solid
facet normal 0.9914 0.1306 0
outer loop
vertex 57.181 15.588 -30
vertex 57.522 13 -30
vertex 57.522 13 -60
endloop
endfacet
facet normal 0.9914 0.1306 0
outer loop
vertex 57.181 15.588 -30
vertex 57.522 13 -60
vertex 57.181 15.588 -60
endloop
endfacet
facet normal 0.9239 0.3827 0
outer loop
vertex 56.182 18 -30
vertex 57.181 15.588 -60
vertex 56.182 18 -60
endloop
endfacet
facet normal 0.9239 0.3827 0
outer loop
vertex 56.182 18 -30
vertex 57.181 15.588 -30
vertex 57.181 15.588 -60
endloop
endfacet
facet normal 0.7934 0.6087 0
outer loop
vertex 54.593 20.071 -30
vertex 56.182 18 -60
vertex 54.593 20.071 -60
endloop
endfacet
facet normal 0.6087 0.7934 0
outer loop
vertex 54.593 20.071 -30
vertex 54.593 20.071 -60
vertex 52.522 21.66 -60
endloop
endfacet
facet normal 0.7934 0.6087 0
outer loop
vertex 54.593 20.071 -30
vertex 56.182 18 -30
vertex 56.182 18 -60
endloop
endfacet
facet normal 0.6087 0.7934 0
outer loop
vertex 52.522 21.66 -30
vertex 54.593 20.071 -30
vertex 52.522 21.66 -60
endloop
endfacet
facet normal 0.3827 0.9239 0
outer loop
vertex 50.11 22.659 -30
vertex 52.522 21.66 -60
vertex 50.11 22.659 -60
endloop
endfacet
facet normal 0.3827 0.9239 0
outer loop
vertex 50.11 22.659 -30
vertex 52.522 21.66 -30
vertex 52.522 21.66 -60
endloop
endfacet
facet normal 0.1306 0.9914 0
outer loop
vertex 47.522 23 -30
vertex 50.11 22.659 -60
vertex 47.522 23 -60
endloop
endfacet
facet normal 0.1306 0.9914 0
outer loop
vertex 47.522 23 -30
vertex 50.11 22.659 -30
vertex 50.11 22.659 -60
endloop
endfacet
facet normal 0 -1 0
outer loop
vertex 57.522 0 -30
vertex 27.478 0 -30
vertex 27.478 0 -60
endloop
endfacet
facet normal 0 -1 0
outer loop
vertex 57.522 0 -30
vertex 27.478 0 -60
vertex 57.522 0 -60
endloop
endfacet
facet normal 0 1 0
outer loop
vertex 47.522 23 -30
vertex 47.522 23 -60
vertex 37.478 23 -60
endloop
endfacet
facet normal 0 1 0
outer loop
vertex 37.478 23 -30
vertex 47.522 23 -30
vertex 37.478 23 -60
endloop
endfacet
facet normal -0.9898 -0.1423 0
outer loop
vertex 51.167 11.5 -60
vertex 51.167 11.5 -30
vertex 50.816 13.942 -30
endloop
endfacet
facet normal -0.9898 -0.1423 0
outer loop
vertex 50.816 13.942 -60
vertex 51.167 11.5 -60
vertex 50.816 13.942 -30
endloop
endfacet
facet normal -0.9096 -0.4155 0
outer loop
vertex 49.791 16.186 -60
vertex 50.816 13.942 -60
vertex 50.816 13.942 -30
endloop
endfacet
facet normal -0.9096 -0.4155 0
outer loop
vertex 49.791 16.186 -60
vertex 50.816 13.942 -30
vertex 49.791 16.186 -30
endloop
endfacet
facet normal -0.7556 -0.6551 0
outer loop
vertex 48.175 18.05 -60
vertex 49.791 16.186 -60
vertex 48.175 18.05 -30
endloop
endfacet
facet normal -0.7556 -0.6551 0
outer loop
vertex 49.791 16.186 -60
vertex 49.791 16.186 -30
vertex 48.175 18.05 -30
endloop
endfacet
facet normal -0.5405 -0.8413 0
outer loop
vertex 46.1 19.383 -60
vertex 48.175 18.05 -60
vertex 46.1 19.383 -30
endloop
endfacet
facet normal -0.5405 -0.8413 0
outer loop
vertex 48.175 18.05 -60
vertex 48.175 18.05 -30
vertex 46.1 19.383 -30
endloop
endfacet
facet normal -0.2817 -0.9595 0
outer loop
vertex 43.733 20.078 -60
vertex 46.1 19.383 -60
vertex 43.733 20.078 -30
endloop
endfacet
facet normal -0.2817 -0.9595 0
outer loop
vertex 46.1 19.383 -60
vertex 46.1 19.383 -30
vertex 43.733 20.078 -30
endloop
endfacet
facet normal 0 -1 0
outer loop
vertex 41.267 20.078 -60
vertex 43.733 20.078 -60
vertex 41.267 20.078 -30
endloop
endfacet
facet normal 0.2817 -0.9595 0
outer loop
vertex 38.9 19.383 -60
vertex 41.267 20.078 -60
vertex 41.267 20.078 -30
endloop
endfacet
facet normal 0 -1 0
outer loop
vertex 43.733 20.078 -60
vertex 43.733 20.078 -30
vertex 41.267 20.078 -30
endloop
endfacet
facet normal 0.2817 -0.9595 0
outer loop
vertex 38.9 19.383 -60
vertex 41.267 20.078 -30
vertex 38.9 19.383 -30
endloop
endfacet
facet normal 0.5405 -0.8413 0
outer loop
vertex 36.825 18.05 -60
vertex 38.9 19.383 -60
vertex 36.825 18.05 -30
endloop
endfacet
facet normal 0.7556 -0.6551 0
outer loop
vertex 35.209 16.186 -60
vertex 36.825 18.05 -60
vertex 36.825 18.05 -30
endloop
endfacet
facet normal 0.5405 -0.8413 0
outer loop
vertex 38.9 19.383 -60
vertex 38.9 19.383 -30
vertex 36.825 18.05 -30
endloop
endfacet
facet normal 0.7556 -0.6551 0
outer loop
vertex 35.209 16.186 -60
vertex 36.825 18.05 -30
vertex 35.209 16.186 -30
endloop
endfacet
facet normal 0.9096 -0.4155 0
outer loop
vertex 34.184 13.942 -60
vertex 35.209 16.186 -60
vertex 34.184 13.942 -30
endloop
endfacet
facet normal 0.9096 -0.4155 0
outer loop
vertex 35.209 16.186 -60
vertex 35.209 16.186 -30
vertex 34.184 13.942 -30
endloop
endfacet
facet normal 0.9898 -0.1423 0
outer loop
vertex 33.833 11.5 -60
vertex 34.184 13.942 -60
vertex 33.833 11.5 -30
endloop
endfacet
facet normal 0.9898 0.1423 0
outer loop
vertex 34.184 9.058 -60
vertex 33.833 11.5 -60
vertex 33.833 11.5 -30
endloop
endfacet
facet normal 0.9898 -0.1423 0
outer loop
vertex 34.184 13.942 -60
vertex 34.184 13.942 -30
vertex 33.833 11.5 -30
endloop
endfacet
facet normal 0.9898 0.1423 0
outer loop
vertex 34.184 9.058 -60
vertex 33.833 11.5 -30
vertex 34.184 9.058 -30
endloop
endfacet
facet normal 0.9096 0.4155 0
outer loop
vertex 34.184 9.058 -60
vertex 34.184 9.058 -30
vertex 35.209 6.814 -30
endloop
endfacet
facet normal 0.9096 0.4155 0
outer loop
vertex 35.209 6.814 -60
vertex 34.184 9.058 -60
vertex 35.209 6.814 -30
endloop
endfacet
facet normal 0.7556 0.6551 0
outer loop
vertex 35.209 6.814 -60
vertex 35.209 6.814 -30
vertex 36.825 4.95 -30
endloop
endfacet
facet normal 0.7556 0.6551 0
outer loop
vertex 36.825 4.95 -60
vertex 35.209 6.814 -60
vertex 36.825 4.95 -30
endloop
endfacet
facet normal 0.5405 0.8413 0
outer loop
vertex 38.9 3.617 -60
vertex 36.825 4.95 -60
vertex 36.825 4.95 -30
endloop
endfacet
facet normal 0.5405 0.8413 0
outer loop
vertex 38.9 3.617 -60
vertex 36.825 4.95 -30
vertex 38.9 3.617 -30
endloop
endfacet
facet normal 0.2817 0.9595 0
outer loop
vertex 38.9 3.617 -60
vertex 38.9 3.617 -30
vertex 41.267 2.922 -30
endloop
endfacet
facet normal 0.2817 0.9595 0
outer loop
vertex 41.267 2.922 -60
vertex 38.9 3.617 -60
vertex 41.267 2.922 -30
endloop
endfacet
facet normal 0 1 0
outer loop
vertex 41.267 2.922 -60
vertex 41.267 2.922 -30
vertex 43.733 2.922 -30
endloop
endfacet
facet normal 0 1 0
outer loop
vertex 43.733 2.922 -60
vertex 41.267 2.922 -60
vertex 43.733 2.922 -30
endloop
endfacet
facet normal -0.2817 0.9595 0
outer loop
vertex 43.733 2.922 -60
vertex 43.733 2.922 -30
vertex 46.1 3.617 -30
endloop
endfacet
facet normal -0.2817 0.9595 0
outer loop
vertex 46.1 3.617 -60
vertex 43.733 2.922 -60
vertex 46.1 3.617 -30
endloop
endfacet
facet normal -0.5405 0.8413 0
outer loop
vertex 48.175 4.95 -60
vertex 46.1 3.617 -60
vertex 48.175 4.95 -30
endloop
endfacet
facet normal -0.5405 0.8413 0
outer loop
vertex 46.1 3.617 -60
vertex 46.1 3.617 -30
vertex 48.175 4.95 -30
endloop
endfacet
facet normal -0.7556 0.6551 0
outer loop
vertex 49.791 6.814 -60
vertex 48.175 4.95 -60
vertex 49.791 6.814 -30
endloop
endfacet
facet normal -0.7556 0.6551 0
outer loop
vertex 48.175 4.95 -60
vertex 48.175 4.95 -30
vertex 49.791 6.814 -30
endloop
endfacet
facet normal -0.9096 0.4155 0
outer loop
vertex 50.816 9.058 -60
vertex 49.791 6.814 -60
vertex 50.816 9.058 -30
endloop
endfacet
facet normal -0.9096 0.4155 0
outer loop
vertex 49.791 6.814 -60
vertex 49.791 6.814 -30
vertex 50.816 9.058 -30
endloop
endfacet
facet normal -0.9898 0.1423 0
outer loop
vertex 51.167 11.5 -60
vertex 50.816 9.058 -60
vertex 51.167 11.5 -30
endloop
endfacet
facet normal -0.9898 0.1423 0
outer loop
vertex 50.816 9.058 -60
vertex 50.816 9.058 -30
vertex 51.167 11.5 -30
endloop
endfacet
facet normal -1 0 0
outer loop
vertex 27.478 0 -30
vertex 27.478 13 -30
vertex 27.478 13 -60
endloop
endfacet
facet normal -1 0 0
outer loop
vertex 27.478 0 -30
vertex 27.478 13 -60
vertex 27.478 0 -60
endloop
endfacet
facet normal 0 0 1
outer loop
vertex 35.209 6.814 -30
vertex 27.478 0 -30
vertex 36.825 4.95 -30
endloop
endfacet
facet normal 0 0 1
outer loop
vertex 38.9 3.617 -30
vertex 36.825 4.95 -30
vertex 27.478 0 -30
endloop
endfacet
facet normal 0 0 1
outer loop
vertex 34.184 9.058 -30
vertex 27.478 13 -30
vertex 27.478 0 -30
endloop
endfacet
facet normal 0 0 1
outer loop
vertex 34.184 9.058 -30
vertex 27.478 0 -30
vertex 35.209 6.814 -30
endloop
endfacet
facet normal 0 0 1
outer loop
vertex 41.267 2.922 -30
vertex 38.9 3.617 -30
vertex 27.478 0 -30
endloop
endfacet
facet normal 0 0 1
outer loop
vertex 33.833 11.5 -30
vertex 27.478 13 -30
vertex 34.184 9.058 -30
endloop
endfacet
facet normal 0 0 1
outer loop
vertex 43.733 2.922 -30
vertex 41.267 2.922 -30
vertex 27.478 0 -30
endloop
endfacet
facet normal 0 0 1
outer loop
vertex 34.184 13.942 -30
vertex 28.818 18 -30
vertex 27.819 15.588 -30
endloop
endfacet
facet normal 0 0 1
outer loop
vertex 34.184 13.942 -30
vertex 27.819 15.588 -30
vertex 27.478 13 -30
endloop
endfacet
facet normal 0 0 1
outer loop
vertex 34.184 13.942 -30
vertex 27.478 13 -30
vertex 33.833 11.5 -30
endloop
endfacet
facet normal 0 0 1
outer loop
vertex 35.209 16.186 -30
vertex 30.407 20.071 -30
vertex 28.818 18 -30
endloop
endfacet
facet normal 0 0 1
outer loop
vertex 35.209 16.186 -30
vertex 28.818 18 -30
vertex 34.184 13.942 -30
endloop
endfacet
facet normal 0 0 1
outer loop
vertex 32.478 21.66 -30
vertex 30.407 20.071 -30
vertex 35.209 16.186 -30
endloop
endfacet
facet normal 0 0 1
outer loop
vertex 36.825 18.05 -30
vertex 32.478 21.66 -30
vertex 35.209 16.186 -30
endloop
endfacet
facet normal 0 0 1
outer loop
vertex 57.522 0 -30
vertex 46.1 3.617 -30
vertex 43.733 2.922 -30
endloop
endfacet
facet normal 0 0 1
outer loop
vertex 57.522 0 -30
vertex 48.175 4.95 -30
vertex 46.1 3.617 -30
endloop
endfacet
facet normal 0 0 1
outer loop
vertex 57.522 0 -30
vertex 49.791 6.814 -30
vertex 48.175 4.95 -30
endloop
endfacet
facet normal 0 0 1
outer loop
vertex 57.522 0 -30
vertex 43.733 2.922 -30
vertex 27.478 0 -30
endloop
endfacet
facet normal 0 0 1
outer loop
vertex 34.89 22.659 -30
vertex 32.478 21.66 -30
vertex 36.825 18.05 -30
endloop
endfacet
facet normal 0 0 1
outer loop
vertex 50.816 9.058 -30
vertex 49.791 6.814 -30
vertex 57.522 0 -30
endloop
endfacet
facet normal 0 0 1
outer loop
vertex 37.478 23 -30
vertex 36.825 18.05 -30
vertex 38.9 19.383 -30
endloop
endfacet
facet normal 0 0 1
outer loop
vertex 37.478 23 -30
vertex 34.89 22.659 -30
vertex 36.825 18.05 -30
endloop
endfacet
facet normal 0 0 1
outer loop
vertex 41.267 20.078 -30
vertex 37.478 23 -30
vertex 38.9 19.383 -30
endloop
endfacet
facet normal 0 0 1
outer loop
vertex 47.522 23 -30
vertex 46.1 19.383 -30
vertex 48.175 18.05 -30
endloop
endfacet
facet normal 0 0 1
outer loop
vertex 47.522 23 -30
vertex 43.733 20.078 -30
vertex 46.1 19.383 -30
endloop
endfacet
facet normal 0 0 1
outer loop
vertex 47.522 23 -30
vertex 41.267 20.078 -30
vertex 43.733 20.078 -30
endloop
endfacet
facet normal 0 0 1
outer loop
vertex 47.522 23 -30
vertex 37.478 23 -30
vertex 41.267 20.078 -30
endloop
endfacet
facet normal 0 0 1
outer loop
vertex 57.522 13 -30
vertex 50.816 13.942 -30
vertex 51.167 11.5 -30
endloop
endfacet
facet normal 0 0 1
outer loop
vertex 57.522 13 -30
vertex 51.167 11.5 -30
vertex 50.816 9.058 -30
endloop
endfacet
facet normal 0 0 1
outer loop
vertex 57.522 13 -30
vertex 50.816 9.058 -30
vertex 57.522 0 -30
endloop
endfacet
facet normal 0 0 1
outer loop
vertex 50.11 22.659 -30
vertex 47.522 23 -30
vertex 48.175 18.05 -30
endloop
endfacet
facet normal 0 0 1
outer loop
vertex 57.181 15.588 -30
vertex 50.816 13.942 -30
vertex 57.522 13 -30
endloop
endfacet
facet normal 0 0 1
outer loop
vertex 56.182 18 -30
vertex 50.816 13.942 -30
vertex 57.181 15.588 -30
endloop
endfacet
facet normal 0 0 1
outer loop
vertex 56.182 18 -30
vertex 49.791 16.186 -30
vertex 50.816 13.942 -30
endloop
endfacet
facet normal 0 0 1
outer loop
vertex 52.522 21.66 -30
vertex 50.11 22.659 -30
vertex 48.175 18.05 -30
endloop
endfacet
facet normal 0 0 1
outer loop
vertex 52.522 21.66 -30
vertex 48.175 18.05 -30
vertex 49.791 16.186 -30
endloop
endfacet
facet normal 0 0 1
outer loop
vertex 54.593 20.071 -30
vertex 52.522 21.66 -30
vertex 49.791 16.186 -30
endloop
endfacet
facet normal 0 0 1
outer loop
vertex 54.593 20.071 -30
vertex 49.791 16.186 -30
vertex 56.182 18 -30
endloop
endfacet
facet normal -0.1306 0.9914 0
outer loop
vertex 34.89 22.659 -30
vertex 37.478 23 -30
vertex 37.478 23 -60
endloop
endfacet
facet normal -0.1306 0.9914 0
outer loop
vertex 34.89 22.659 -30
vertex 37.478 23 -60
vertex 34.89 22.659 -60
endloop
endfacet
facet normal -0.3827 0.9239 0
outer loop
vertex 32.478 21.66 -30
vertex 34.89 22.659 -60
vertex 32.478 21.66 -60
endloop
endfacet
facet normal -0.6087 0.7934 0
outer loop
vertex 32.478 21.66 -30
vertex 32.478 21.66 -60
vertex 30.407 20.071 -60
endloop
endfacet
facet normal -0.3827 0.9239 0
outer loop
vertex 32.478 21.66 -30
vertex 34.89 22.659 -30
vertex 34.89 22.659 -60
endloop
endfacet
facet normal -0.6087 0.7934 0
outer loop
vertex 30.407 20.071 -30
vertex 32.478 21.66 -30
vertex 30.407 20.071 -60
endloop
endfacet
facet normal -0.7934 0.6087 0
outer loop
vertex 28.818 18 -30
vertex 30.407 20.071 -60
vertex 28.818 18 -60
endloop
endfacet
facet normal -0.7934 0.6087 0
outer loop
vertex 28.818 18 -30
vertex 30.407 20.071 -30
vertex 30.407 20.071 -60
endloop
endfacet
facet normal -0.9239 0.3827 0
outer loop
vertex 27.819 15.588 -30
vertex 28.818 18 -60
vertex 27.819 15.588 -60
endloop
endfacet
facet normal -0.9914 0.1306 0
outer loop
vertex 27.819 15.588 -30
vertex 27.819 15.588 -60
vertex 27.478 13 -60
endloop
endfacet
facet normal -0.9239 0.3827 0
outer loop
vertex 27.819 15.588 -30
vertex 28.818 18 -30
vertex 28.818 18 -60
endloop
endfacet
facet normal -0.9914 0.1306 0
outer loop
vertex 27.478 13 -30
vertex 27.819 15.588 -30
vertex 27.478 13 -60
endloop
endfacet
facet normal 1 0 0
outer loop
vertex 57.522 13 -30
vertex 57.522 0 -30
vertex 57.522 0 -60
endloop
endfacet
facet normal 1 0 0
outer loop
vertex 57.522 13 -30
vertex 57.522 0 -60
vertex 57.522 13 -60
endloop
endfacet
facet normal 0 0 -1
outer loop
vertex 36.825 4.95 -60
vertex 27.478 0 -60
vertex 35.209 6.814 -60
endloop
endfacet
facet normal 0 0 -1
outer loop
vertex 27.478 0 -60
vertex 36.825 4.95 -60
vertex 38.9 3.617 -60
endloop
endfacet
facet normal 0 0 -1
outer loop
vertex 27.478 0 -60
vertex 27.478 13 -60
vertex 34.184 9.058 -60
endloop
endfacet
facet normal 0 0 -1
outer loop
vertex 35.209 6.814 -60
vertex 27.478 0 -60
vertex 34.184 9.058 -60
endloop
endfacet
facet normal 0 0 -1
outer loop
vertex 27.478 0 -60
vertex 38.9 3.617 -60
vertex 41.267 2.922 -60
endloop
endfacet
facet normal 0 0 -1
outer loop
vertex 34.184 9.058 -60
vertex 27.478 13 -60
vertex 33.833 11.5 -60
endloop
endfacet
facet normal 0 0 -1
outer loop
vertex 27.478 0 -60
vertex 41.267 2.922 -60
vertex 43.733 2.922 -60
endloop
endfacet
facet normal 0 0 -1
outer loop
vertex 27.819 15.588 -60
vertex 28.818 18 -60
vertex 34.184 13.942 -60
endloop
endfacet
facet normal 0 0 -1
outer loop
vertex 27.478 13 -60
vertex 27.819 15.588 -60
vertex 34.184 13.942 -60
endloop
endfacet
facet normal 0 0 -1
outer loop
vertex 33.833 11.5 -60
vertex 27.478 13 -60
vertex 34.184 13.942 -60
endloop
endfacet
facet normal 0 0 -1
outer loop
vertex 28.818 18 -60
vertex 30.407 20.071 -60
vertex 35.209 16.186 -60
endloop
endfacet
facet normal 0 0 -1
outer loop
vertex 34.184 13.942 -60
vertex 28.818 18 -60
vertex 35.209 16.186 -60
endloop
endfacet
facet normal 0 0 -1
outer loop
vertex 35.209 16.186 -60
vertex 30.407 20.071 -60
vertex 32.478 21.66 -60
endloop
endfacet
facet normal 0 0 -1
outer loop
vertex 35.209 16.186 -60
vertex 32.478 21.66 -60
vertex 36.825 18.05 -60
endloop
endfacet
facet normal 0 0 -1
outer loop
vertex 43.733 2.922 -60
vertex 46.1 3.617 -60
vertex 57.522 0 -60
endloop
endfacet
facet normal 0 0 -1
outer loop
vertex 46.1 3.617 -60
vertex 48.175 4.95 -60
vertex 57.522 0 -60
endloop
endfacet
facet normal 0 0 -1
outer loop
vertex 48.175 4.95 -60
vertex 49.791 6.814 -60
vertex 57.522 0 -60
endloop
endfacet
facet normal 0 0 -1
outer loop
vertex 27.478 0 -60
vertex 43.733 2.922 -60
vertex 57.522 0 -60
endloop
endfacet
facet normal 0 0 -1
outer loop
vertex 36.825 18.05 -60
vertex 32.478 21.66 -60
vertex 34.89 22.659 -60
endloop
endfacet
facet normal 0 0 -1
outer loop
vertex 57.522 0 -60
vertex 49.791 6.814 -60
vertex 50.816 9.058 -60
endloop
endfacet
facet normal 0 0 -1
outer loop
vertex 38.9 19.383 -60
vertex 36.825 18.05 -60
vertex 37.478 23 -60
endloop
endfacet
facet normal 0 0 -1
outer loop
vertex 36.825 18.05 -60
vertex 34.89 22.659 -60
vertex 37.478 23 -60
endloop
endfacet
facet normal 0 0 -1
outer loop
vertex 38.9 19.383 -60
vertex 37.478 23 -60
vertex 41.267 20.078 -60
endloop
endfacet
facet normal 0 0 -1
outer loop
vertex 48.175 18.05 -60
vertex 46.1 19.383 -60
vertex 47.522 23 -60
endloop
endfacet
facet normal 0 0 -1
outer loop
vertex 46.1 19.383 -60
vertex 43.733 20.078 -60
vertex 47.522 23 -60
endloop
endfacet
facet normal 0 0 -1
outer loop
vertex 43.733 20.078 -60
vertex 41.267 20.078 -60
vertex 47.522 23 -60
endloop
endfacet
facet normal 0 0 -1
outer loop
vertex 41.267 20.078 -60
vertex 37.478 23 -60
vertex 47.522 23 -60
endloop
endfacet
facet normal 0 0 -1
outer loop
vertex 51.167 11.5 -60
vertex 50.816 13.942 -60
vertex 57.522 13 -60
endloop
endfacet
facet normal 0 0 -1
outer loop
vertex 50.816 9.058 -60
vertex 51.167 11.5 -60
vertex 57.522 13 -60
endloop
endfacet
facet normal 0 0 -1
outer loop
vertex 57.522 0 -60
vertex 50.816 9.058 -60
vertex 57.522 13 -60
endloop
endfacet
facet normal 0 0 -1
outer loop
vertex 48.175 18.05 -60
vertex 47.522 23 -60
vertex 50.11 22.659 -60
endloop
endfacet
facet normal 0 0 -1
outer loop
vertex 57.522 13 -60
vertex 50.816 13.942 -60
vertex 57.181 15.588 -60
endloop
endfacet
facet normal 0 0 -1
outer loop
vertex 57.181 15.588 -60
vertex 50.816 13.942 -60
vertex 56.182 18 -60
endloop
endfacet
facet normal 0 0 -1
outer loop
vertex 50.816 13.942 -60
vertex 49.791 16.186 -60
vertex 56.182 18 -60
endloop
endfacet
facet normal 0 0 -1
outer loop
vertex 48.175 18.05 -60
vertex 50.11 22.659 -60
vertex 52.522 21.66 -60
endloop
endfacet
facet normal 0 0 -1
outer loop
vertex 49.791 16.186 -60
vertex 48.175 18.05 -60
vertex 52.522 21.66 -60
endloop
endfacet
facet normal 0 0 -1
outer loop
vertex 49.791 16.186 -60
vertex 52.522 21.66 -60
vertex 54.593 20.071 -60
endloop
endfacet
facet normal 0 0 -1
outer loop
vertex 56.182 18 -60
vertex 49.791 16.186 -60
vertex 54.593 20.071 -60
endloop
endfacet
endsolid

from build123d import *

# Parameters (mm, degrees)
EXTRUDE_START   = -30
SKETCH_1_R      = 8.666666667
EXTRUDE_1_DEPTH = 30


with BuildPart() as part:
    # 草图1 → 凸台-拉伸1 (new body)
    with BuildSketch(Plane.XY.offset(EXTRUDE_START)):
        with BuildLine():
            Line((47.521768078, 23), (37.478231922, 23))
            ThreePointArc((37.478231922, 23), (30.40716411, 20.071067812), (27.478231922, 13))
            Line((27.478231922, 13), (27.478231922, 0))
            Line((27.478231922, 0), (57.521768078, 0))
            Line((57.521768078, 0), (57.521768078, 13))
            ThreePointArc((57.521768078, 13), (54.59283589, 20.071067812), (47.521768078, 23))
        make_face()
        with Locations((42.5, 11.5)):
            Circle(SKETCH_1_R, mode=Mode.SUBTRACT)
    extrude(amount=-EXTRUDE_1_DEPTH)


solid = part.part
